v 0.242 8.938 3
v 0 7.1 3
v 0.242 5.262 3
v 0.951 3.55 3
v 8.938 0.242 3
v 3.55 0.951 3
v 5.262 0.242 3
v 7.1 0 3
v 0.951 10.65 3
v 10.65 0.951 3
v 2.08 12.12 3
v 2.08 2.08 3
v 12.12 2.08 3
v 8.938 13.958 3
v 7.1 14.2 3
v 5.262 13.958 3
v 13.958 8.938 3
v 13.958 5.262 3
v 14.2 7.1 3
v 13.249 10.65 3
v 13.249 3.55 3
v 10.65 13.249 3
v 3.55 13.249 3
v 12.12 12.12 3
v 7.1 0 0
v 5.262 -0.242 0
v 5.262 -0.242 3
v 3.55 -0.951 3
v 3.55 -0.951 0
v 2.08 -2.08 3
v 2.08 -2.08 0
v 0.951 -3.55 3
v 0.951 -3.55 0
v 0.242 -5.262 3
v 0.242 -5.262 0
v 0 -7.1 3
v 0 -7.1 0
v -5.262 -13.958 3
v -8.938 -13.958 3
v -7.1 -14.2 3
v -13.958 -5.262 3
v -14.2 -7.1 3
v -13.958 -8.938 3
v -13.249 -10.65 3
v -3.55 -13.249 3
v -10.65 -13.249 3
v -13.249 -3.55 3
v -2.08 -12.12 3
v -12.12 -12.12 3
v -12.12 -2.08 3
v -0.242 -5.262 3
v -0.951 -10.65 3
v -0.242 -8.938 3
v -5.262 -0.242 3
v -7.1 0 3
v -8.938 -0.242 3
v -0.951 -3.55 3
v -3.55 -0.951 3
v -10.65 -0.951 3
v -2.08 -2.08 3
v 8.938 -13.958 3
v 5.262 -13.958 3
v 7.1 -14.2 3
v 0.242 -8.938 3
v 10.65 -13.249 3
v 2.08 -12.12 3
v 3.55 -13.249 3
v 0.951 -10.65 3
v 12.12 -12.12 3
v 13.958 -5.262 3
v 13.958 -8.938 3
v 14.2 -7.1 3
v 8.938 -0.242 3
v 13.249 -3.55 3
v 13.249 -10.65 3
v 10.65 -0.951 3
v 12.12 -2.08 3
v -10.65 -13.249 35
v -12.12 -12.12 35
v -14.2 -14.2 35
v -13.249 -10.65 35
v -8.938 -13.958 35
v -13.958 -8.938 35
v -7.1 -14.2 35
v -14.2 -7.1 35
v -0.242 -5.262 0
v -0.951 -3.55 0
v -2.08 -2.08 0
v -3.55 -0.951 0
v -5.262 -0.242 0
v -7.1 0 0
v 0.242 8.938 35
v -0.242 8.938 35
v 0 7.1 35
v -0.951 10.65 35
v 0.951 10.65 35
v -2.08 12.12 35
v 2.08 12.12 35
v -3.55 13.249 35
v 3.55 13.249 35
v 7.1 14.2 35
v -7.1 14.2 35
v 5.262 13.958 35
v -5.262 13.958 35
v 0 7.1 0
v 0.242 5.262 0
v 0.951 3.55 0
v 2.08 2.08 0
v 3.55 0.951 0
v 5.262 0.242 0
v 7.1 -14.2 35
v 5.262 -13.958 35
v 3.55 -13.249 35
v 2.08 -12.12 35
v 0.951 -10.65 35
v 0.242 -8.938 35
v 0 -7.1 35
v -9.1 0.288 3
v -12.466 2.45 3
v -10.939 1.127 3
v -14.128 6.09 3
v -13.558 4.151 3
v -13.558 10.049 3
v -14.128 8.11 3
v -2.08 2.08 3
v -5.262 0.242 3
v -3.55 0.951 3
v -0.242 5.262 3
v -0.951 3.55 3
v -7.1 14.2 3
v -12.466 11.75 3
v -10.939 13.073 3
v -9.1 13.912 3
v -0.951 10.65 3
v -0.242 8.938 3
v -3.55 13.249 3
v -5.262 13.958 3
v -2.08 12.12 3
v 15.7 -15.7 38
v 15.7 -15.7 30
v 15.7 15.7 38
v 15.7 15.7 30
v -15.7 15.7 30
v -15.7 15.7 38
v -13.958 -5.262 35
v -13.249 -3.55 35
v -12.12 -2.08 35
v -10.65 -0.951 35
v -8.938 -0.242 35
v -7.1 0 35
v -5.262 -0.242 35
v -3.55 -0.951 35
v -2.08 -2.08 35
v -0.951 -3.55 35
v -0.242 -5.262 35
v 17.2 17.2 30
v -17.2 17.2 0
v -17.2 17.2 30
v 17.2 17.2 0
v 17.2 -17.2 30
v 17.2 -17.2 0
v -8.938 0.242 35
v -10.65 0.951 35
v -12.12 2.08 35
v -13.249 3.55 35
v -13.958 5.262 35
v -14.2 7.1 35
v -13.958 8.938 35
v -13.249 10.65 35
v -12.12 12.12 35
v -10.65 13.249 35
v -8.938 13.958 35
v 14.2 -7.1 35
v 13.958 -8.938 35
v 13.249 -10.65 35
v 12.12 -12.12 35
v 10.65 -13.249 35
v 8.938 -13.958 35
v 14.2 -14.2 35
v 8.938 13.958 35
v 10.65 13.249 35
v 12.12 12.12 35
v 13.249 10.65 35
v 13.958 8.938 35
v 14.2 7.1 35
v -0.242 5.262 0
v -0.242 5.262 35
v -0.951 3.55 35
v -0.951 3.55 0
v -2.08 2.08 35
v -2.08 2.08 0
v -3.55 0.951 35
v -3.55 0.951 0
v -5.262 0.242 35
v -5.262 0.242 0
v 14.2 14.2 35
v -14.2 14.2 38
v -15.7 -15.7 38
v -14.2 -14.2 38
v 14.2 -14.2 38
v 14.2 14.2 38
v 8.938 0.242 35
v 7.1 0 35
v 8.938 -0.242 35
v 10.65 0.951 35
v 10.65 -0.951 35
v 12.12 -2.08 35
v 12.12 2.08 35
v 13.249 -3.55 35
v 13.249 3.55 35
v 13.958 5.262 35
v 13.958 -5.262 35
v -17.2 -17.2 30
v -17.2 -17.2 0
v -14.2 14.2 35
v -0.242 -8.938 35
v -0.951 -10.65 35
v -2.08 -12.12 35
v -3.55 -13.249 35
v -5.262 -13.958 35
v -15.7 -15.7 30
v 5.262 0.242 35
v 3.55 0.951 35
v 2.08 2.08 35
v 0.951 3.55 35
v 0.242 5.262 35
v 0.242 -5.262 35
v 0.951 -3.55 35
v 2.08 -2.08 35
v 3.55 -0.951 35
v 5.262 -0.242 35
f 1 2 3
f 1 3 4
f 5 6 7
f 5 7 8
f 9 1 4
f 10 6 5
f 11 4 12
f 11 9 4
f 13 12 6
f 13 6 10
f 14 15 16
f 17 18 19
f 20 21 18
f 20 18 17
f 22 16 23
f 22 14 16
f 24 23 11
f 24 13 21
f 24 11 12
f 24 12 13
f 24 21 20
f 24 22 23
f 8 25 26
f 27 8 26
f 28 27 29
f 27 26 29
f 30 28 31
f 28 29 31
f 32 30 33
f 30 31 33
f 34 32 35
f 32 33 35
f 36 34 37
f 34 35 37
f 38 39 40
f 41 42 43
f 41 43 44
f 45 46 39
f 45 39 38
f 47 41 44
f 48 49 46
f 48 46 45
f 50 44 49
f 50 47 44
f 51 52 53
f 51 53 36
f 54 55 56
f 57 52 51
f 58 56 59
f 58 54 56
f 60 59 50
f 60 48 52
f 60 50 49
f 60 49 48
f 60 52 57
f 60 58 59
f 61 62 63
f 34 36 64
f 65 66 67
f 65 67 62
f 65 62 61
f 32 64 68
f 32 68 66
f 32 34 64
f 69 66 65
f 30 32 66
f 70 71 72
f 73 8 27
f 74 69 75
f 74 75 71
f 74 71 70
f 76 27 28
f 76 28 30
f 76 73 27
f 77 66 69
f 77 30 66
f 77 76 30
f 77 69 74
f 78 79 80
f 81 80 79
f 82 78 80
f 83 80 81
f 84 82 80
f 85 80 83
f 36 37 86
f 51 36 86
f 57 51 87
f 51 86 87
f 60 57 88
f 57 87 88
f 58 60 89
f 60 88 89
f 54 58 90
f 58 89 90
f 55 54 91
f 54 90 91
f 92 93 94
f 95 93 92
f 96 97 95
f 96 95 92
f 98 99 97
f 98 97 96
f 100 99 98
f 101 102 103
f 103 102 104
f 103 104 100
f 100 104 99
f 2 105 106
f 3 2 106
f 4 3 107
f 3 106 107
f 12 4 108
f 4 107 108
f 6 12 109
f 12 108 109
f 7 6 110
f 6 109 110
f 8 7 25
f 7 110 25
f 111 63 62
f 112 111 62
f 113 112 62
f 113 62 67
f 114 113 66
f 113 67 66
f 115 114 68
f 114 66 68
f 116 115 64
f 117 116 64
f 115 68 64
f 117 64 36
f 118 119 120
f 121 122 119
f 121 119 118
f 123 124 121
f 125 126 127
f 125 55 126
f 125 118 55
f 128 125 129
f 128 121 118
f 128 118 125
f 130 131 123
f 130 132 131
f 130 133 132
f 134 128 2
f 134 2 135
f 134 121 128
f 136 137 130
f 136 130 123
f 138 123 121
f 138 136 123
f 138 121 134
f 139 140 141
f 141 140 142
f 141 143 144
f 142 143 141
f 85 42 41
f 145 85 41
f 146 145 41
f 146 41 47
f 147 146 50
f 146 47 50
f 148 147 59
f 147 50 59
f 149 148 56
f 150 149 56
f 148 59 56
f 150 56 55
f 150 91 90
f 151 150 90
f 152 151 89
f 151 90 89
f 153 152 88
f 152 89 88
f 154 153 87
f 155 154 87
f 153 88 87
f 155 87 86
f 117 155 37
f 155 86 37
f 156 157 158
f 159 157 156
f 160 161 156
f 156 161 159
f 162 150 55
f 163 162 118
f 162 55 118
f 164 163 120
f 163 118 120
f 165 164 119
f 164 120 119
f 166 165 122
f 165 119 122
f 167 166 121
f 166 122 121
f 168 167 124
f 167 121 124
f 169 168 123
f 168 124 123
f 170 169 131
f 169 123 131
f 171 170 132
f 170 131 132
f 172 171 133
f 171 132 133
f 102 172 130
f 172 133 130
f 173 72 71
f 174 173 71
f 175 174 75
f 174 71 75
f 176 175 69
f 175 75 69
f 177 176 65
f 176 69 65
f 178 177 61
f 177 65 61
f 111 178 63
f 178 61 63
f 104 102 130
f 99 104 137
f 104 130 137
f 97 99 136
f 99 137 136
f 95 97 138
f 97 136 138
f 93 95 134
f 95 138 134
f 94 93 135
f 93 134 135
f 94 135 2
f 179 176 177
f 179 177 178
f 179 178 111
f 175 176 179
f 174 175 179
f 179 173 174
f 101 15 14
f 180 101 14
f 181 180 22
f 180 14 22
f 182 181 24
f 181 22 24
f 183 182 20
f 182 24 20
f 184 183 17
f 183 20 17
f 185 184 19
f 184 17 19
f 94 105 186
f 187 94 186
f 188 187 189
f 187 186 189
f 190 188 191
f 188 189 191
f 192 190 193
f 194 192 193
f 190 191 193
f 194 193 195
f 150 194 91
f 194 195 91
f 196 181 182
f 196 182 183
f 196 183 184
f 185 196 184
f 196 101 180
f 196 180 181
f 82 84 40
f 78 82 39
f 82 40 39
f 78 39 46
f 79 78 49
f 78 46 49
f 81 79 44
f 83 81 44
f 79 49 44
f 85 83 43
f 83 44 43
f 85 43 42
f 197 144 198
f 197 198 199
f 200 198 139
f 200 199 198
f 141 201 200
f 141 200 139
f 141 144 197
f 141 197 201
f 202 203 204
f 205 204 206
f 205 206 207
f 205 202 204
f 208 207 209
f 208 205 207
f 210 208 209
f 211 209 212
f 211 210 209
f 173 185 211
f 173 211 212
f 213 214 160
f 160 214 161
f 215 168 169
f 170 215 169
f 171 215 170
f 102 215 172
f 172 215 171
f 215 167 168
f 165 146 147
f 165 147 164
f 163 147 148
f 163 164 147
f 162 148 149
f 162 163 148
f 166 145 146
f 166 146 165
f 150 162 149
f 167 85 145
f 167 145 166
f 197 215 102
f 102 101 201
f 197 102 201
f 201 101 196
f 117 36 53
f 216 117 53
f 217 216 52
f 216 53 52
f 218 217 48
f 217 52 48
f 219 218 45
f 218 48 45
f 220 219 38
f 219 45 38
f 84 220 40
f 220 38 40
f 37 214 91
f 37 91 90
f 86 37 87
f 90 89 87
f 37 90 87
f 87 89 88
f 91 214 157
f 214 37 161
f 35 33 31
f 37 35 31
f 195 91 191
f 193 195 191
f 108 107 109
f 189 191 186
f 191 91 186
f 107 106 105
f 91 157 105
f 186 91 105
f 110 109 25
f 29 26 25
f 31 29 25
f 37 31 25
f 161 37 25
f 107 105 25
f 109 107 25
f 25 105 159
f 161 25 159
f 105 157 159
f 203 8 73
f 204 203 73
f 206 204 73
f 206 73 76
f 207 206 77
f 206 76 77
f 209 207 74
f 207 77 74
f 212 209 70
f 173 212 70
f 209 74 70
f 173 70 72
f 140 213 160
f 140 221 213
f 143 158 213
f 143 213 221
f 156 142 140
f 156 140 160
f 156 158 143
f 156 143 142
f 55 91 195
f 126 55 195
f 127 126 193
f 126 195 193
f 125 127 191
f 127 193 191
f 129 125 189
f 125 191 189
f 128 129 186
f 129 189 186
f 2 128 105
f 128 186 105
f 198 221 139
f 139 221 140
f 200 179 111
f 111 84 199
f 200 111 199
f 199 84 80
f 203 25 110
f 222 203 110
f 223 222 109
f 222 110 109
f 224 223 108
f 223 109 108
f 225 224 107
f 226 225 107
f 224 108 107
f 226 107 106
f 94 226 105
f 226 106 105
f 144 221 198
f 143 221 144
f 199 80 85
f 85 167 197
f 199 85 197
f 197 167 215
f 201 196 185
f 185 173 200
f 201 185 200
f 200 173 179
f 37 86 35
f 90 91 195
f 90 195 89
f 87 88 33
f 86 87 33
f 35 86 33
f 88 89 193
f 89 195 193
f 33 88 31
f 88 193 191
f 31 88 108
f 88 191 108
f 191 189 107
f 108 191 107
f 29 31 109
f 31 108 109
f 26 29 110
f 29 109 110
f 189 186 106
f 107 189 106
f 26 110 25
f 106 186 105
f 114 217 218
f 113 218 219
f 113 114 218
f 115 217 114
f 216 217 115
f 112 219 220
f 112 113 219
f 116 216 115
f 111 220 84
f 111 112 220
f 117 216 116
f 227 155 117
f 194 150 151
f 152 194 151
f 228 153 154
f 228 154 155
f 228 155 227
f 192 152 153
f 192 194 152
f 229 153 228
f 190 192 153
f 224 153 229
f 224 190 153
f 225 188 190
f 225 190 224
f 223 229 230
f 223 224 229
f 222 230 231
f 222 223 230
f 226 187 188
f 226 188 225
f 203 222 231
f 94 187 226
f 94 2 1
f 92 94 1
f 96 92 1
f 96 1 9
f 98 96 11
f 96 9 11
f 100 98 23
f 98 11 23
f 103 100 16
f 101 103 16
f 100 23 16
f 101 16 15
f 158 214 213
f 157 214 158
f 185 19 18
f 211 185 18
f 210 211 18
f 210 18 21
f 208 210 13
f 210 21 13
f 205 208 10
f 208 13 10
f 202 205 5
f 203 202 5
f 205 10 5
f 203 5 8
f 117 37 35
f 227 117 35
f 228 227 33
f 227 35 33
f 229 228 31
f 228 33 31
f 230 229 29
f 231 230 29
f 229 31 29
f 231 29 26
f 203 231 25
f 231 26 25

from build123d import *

# Parameters (mm, degrees)
F0_W     = 31.4
F0_H     = 31.4
F1_DEPTH = 38
F0_W_2   = 34.4
F0_H_2   = 34.4
F2_DEPTH = 30
F3_DEPTH = 35
F4_DEPTH = 3


with BuildPart() as f1:
    # F0 (on Top) → F1 (new body)
    with BuildSketch(Plane.XY):
        Rectangle(F0_W, F0_H)
        Polygon((7.1, 14.2), (14.2, 14.2), (14.2, 7.1), (14.2, -7.1), (14.2, -14.2), (7.1, -14.2), (-7.1000000056, -14.2), (-14.2, -14.2), (-14.2, -7.1), (-14.2, 7.1), (-14.2, 14.2), (-7.0999999722, 14.2), align=None, mode=Mode.SUBTRACT)
    extrude(amount=F1_DEPTH)

    # F0 (on Top) → F2 (join)
    with BuildSketch(Plane.XY):
        Rectangle(F0_W_2, F0_H_2)
        Rectangle(F0_W, F0_H, mode=Mode.SUBTRACT)
    extrude(amount=F2_DEPTH)

    # F0 (on Top) → F3, piece 2 (join)
    with BuildSketch(Plane.XY):
        with BuildLine():
            ThreePointArc((-14.2, 7.1), (-12.1204581366, 12.1204581563), (-7.0999999722, 14.2))
            Line((-7.0999999722, 14.2), (-14.2, 14.2))
            Line((-14.2, 14.2), (-14.2, 7.1))
        make_face()
        with BuildLine():
            ThreePointArc((0, 7.1), (2.0795418536, 12.1204581464), (7.1, 14.2))
            Line((7.1, 14.2), (-7.0999999722, 14.2))
            ThreePointArc((-7.0999999722, 14.2), (-2.0795418437, 12.1204581366), (0, 7.1))
        make_face()
        with BuildLine():
            Line((14.2, 7.1), (14.2, 14.2))
            Line((14.2, 14.2), (7.1, 14.2))
            ThreePointArc((7.1, 14.2), (12.1204581464, 12.1204581464), (14.2, 7.1))
        make_face()
        with BuildLine():
            Line((14.2, -7.1), (14.2, 7.1))
            ThreePointArc((14.2, 7.1), (12.1204581464, 2.0795418536), (7.1, 0))
            ThreePointArc((7.1, 0), (12.1204581464, -2.0795418536), (14.2, -7.1))
        make_face()
        with BuildLine():
            ThreePointArc((-7.1, 0), (-12.1204581464, 2.0795418536), (-14.2, 7.1))
            Line((-14.2, 7.1), (-14.2, -7.1))
            ThreePointArc((-14.2, -7.1), (-12.1204581464, -2.0795418536), (-7.1, 0))
        make_face()
        with BuildLine():
            ThreePointArc((-7.1000000056, -14.2), (-12.1204581484, -12.1204581444), (-14.2, -7.1))
            Line((-14.2, -7.1), (-14.2, -14.2))
            Line((-14.2, -14.2), (-7.1000000056, -14.2))
        make_face()
        with BuildLine():
            Line((-7.1000000056, -14.2), (7.1, -14.2))
            ThreePointArc((7.1, -14.2), (2.0795418536, -12.1204581464), (0, -7.1))
            ThreePointArc((0, -7.1), (-2.0795418556, -12.1204581484), (-7.1000000056, -14.2))
        make_face()
        with BuildLine():
            Line((14.2, -14.2), (14.2, -7.1))
            ThreePointArc((14.2, -7.1), (12.1204581464, -12.1204581464), (7.1, -14.2))
            Line((7.1, -14.2), (14.2, -14.2))
        make_face()
    extrude(amount=F3_DEPTH)

    # F0 (on Top) → F4 (join)
    with BuildSketch(Plane.XY):
        with BuildLine():
            Line((-7.1, -7.1), (-7.1, 0))
            ThreePointArc((-7.1, 0), (-12.1204581464, -2.0795418536), (-14.2, -7.1))
            ThreePointArc((-14.2, -7.1), (-12.1204581484, -12.1204581444), (-7.1000000056, -14.2))
            ThreePointArc((-7.1000000056, -14.2), (-2.0795418556, -12.1204581484), (0, -7.1))
            Line((0, -7.1), (-7.1, -7.1))
        make_face()
        with BuildLine():
            ThreePointArc((0, 7.1), (-2.0795418437, 12.1204581366), (-7.0999999722, 14.2))
            ThreePointArc((-7.0999999722, 14.2), (-12.1204581366, 12.1204581563), (-14.2, 7.1))
            ThreePointArc((-14.2, 7.1), (-12.1204581464, 2.0795418536), (-7.1, 0))
            Line((-7.1, 0), (-7.1, 7.1))
            Line((-7.1, 7.1), (0, 7.1))
        make_face()
        with BuildLine():
            ThreePointArc((0, -7.1), (-2.0795418536, -2.0795418536), (-7.1, 0))
            Line((-7.1, 0), (-7.1, -7.1))
            Line((-7.1, -7.1), (0, -7.1))
        make_face()
        with BuildLine():
            ThreePointArc((-7.1, 0), (-2.0795418536, 2.0795418536), (0, 7.1))
            Line((0, 7.1), (-7.1, 7.1))
            Line((-7.1, 7.1), (-7.1, 0))
        make_face()
        with BuildLine():
            ThreePointArc((7.1, -14.2), (12.1204581464, -12.1204581464), (14.2, -7.1))
            ThreePointArc((14.2, -7.1), (12.1204581464, -2.0795418536), (7.1, 0))
            Line((7.1, 0), (7.1, -7.1))
            Line((7.1, -7.1), (0, -7.1))
            ThreePointArc((0, -7.1), (2.0795418536, -12.1204581464), (7.1, -14.2))
        make_face()
        with BuildLine():
            Line((7.1, -7.1), (7.1, 0))
            ThreePointArc((7.1, 0), (2.0795418536, -2.0795418536), (0, -7.1))
            Line((0, -7.1), (7.1, -7.1))
        make_face()
        with BuildLine():
            ThreePointArc((14.2, 7.1), (12.1204581464, 12.1204581464), (7.1, 14.2))
            ThreePointArc((7.1, 14.2), (2.0795418536, 12.1204581464), (0, 7.1))
            Line((0, 7.1), (7.1, 7.1))
            Line((7.1, 7.1), (7.1, 0))
            ThreePointArc((7.1, 0), (12.1204581464, 2.0795418536), (14.2, 7.1))
        make_face()
        with BuildLine():
            Line((7.1, 7.1), (0, 7.1))
            ThreePointArc((0, 7.1), (2.0795418536, 2.0795418536), (7.1, 0))
            Line((7.1, 0), (7.1, 7.1))
        make_face()
    extrude(amount=F4_DEPTH)


with BuildPart() as f3:
    # F0 (on Top) → F3 (new body)
    with BuildSketch(Plane.XY):
        with BuildLine():
            ThreePointArc((7.1, 0), (2.0795418536, 2.0795418536), (0, 7.1))
            Line((0, 7.1), (0, 0))
            Line((0, 0), (7.1, 0))
        make_face()
        with BuildLine():
            Line((0, 0), (0, 7.1))
            ThreePointArc((0, 7.1), (-2.0795418536, 2.0795418536), (-7.1, 0))
            Line((-7.1, 0), (0, 0))
        make_face()
        with BuildLine():
            Line((0, -7.1), (0, 0))
            Line((0, 0), (-7.1, 0))
            ThreePointArc((-7.1, 0), (-2.0795418536, -2.0795418536), (0, -7.1))
        make_face()
        with BuildLine():
            ThreePointArc((0, -7.1), (2.0795418536, -2.0795418536), (7.1, 0))
            Line((7.1, 0), (0, 0))
            Line((0, 0), (0, -7.1))
        make_face()
    extrude(amount=F3_DEPTH)


solid = Compound([f1.part, f3.part])
